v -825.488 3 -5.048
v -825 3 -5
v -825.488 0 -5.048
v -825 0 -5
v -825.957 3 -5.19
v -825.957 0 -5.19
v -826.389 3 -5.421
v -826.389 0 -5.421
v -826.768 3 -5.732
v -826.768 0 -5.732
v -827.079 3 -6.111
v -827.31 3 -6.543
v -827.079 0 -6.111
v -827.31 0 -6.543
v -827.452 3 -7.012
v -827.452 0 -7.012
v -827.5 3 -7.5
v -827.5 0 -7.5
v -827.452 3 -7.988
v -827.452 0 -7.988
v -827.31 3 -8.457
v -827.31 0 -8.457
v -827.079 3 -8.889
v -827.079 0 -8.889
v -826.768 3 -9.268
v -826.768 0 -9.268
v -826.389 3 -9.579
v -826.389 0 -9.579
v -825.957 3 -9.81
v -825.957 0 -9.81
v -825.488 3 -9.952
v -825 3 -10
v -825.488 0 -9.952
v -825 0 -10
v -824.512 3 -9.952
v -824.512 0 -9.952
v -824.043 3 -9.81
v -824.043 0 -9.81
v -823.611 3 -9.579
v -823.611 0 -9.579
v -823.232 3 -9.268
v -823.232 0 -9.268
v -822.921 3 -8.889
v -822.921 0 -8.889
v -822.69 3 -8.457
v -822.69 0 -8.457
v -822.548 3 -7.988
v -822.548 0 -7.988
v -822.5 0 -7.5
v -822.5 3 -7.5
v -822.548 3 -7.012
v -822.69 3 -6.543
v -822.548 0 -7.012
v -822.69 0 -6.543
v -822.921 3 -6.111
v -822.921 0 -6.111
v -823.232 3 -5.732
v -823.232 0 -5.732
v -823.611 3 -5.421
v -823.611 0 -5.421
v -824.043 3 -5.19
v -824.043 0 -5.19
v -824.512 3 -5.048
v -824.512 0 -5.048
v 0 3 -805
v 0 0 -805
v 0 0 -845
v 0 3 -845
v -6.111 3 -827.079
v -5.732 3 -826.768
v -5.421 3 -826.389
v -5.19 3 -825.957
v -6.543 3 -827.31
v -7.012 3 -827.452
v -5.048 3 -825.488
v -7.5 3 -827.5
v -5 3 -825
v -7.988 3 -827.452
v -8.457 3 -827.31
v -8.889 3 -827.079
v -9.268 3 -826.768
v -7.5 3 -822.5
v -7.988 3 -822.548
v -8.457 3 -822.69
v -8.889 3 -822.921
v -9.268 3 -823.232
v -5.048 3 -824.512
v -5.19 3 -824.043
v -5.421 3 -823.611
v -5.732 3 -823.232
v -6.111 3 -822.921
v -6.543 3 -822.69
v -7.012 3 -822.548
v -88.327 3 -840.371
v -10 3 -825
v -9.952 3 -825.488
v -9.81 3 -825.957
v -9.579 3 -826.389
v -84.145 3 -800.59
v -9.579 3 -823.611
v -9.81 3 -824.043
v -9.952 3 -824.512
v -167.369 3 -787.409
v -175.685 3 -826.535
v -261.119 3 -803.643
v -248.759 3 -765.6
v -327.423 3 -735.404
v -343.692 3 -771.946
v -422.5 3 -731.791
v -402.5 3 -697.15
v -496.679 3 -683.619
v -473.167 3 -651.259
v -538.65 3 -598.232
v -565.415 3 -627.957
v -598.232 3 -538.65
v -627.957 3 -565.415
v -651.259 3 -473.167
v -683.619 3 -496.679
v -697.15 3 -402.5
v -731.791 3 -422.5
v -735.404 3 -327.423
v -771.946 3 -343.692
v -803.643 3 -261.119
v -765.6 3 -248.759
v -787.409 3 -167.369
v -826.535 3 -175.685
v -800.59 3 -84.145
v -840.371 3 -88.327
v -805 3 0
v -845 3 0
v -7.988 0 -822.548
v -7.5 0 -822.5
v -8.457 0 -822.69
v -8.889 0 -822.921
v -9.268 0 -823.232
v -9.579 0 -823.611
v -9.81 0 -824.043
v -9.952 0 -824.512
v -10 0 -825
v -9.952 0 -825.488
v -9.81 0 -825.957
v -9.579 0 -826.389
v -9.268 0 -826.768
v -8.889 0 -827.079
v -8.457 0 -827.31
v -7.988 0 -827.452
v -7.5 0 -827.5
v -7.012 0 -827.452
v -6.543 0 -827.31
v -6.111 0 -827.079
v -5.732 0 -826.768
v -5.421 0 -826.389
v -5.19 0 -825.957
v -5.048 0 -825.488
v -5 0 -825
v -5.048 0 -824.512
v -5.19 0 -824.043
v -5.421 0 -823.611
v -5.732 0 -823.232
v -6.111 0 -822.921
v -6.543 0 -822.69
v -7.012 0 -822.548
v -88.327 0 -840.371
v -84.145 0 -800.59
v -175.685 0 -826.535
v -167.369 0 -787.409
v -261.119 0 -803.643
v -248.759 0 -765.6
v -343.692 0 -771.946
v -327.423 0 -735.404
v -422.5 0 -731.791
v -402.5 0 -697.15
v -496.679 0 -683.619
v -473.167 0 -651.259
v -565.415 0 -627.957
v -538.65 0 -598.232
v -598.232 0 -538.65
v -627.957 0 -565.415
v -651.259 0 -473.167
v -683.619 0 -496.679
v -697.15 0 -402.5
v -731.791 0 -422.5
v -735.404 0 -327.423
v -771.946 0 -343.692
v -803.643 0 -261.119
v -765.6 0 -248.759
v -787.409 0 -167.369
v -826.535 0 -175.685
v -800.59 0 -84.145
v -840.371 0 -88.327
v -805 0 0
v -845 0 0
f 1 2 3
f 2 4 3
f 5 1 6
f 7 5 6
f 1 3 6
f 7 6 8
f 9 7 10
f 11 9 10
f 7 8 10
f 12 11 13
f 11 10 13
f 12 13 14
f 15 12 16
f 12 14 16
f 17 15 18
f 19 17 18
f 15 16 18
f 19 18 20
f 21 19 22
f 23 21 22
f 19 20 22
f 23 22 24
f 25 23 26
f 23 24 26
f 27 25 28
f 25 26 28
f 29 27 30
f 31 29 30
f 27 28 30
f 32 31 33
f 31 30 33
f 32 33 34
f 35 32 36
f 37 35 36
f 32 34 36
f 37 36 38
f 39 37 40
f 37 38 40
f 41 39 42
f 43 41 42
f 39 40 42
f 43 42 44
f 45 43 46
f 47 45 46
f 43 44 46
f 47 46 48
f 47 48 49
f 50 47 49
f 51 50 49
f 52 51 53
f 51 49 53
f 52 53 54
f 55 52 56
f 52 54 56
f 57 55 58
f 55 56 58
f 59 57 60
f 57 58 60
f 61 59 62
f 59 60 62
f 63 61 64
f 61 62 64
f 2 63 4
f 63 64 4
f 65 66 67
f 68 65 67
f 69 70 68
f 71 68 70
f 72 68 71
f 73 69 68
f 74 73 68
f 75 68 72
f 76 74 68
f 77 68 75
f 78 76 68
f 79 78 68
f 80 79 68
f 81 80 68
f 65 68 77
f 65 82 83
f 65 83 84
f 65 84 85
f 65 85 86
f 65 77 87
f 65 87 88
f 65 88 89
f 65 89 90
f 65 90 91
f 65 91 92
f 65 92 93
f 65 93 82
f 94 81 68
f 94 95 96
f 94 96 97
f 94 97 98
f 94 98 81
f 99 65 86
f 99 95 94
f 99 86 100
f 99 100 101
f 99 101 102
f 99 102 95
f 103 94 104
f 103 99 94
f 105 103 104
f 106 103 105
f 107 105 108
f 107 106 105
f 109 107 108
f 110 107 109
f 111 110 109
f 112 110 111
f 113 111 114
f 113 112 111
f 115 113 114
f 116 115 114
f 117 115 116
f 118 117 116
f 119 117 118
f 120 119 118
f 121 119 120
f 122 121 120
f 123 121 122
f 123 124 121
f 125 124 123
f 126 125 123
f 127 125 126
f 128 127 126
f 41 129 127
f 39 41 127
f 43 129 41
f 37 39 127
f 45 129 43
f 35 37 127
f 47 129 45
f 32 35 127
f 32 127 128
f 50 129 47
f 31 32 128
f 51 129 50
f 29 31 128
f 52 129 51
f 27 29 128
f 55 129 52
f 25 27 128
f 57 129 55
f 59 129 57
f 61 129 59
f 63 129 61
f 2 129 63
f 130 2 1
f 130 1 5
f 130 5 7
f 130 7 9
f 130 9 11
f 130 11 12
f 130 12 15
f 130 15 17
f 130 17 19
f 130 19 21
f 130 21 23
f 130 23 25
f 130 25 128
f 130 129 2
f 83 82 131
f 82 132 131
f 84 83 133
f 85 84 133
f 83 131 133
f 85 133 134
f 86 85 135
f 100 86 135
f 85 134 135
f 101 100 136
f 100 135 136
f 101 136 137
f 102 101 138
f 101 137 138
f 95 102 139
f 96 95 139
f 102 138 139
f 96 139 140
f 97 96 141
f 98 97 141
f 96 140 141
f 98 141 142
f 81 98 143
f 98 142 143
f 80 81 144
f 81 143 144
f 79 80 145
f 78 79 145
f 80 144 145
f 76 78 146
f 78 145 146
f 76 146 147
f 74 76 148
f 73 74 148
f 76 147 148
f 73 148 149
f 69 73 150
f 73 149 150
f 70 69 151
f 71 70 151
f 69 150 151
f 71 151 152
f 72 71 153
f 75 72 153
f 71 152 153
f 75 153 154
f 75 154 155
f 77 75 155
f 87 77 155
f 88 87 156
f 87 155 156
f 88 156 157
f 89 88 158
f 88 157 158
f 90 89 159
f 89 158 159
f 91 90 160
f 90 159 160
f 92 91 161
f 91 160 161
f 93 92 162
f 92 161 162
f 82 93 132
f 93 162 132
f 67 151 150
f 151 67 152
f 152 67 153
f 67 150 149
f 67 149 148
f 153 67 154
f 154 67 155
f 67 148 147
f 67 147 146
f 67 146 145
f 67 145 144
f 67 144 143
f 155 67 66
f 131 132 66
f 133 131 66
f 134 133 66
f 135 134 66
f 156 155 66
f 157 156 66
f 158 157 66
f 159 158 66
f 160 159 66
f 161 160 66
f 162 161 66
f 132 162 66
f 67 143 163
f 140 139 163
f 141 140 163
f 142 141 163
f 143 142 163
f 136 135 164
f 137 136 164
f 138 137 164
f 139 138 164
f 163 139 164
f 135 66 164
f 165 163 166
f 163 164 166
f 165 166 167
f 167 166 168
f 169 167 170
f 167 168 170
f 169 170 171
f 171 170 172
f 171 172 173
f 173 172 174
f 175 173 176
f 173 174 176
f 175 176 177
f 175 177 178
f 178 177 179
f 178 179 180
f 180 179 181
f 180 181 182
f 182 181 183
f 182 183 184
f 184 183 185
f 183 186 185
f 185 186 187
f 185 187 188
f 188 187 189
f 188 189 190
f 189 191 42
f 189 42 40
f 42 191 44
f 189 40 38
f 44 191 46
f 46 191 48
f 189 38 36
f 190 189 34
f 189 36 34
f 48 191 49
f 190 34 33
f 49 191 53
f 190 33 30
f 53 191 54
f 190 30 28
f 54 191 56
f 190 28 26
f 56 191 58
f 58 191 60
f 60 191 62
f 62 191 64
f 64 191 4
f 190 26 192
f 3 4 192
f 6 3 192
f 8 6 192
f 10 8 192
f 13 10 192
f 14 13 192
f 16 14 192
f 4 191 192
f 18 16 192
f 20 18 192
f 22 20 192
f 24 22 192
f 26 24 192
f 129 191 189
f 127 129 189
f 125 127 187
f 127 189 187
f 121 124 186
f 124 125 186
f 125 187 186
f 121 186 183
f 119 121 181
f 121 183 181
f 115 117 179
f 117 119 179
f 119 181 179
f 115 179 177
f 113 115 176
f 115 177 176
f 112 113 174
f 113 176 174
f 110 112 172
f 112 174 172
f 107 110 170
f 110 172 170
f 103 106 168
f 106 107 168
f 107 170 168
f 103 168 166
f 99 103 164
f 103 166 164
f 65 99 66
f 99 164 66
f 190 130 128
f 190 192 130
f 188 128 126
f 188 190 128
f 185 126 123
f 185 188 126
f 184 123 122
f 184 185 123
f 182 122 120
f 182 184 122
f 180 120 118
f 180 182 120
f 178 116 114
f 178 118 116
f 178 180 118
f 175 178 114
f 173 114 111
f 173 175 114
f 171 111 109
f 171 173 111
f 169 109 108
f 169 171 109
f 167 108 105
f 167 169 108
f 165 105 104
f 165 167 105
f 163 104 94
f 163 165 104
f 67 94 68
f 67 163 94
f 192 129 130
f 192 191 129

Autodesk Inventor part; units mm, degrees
ref_plane "YZ Plane" through (0, 0, 0) normal (1, 0, 0) x (0, 1, 0)
ref_plane "XZ Plane" through (0, 0, 0) normal (0, 1, 0) x (-1, 0, 0)
ref_plane "XY Plane" through (0, 0, 0) normal (0, 0, 1) x (1, 0, 0)
sketch "Esboço1" plane through (0, 0, 0) normal (0, 1, 0) x (-1, 0, 0)
  arc A0 (0, -805) -> (805, 0) centre (0, 0) ccw
  arc A1 (0, -845) -> (845, 0) centre (0, 0) ccw
  line L0 (805, 0) -> (845, 0)
  line L1 (0, -805) -> (0, -845)
  circle A2 centre (7.5, -815) radius 2.5
  circle A3 centre (7.5, -835) radius 2.5
  circle A4 centre (835, -7.5) radius 2.5
  circle A5 centre (815, -7.5) radius 2.5
  circle A6 centre (835, -7.5) radius 2.5
  circle A7 centre (815, -7.5) radius 2.5
  dimension "d0" = 805
  dimension "d1" = 845
  dimension "d2" = 5
  dimension "d3" = 5
  dimension "d4" = 20
  dimension "d6" = 7.5
  dimension "d7" = 5
  dimension "d8" = 5
  dimension "d9" = 7.5
  dimension "d10" = 10
  dimension "d11" = 20
  dimension "d13" = 7.5
  dimension "d14" = 7.5
  dimension "d15" = 10
extrude "Extrusão1" add sketch "Esboço1" along normal blind 3 contours A0 L0 A1 L1 | A2 | A3 | A4 | A5
sketch "Esboço4" plane through (0, 3, 0) normal (0, 1, 0) x (1, 0, 0)
  circle A0 centre (-825, 7.5) radius 2.5
  line L0 (-845, 0) -> (-805, 0) projected
  circle A1 centre (-7.5, 825) radius 2.5
  line L1 (0, 805) -> (0, 845) projected
  point P0 (0, 0)
  dimension "d19" = 5
  dimension "d22" = 7.5
  dimension "d25" = 5
  dimension "d26" = 7.5
  dimension "d44" = 20
  dimension "d45" = 20
hole "Furo1" at (-825, 3, -7.5) at (-7.5, 3, -825) direction (0, -1, 0) diameter 5 end through all
properties part number "Arco menor_CPY" material "Alumínio 6061"
